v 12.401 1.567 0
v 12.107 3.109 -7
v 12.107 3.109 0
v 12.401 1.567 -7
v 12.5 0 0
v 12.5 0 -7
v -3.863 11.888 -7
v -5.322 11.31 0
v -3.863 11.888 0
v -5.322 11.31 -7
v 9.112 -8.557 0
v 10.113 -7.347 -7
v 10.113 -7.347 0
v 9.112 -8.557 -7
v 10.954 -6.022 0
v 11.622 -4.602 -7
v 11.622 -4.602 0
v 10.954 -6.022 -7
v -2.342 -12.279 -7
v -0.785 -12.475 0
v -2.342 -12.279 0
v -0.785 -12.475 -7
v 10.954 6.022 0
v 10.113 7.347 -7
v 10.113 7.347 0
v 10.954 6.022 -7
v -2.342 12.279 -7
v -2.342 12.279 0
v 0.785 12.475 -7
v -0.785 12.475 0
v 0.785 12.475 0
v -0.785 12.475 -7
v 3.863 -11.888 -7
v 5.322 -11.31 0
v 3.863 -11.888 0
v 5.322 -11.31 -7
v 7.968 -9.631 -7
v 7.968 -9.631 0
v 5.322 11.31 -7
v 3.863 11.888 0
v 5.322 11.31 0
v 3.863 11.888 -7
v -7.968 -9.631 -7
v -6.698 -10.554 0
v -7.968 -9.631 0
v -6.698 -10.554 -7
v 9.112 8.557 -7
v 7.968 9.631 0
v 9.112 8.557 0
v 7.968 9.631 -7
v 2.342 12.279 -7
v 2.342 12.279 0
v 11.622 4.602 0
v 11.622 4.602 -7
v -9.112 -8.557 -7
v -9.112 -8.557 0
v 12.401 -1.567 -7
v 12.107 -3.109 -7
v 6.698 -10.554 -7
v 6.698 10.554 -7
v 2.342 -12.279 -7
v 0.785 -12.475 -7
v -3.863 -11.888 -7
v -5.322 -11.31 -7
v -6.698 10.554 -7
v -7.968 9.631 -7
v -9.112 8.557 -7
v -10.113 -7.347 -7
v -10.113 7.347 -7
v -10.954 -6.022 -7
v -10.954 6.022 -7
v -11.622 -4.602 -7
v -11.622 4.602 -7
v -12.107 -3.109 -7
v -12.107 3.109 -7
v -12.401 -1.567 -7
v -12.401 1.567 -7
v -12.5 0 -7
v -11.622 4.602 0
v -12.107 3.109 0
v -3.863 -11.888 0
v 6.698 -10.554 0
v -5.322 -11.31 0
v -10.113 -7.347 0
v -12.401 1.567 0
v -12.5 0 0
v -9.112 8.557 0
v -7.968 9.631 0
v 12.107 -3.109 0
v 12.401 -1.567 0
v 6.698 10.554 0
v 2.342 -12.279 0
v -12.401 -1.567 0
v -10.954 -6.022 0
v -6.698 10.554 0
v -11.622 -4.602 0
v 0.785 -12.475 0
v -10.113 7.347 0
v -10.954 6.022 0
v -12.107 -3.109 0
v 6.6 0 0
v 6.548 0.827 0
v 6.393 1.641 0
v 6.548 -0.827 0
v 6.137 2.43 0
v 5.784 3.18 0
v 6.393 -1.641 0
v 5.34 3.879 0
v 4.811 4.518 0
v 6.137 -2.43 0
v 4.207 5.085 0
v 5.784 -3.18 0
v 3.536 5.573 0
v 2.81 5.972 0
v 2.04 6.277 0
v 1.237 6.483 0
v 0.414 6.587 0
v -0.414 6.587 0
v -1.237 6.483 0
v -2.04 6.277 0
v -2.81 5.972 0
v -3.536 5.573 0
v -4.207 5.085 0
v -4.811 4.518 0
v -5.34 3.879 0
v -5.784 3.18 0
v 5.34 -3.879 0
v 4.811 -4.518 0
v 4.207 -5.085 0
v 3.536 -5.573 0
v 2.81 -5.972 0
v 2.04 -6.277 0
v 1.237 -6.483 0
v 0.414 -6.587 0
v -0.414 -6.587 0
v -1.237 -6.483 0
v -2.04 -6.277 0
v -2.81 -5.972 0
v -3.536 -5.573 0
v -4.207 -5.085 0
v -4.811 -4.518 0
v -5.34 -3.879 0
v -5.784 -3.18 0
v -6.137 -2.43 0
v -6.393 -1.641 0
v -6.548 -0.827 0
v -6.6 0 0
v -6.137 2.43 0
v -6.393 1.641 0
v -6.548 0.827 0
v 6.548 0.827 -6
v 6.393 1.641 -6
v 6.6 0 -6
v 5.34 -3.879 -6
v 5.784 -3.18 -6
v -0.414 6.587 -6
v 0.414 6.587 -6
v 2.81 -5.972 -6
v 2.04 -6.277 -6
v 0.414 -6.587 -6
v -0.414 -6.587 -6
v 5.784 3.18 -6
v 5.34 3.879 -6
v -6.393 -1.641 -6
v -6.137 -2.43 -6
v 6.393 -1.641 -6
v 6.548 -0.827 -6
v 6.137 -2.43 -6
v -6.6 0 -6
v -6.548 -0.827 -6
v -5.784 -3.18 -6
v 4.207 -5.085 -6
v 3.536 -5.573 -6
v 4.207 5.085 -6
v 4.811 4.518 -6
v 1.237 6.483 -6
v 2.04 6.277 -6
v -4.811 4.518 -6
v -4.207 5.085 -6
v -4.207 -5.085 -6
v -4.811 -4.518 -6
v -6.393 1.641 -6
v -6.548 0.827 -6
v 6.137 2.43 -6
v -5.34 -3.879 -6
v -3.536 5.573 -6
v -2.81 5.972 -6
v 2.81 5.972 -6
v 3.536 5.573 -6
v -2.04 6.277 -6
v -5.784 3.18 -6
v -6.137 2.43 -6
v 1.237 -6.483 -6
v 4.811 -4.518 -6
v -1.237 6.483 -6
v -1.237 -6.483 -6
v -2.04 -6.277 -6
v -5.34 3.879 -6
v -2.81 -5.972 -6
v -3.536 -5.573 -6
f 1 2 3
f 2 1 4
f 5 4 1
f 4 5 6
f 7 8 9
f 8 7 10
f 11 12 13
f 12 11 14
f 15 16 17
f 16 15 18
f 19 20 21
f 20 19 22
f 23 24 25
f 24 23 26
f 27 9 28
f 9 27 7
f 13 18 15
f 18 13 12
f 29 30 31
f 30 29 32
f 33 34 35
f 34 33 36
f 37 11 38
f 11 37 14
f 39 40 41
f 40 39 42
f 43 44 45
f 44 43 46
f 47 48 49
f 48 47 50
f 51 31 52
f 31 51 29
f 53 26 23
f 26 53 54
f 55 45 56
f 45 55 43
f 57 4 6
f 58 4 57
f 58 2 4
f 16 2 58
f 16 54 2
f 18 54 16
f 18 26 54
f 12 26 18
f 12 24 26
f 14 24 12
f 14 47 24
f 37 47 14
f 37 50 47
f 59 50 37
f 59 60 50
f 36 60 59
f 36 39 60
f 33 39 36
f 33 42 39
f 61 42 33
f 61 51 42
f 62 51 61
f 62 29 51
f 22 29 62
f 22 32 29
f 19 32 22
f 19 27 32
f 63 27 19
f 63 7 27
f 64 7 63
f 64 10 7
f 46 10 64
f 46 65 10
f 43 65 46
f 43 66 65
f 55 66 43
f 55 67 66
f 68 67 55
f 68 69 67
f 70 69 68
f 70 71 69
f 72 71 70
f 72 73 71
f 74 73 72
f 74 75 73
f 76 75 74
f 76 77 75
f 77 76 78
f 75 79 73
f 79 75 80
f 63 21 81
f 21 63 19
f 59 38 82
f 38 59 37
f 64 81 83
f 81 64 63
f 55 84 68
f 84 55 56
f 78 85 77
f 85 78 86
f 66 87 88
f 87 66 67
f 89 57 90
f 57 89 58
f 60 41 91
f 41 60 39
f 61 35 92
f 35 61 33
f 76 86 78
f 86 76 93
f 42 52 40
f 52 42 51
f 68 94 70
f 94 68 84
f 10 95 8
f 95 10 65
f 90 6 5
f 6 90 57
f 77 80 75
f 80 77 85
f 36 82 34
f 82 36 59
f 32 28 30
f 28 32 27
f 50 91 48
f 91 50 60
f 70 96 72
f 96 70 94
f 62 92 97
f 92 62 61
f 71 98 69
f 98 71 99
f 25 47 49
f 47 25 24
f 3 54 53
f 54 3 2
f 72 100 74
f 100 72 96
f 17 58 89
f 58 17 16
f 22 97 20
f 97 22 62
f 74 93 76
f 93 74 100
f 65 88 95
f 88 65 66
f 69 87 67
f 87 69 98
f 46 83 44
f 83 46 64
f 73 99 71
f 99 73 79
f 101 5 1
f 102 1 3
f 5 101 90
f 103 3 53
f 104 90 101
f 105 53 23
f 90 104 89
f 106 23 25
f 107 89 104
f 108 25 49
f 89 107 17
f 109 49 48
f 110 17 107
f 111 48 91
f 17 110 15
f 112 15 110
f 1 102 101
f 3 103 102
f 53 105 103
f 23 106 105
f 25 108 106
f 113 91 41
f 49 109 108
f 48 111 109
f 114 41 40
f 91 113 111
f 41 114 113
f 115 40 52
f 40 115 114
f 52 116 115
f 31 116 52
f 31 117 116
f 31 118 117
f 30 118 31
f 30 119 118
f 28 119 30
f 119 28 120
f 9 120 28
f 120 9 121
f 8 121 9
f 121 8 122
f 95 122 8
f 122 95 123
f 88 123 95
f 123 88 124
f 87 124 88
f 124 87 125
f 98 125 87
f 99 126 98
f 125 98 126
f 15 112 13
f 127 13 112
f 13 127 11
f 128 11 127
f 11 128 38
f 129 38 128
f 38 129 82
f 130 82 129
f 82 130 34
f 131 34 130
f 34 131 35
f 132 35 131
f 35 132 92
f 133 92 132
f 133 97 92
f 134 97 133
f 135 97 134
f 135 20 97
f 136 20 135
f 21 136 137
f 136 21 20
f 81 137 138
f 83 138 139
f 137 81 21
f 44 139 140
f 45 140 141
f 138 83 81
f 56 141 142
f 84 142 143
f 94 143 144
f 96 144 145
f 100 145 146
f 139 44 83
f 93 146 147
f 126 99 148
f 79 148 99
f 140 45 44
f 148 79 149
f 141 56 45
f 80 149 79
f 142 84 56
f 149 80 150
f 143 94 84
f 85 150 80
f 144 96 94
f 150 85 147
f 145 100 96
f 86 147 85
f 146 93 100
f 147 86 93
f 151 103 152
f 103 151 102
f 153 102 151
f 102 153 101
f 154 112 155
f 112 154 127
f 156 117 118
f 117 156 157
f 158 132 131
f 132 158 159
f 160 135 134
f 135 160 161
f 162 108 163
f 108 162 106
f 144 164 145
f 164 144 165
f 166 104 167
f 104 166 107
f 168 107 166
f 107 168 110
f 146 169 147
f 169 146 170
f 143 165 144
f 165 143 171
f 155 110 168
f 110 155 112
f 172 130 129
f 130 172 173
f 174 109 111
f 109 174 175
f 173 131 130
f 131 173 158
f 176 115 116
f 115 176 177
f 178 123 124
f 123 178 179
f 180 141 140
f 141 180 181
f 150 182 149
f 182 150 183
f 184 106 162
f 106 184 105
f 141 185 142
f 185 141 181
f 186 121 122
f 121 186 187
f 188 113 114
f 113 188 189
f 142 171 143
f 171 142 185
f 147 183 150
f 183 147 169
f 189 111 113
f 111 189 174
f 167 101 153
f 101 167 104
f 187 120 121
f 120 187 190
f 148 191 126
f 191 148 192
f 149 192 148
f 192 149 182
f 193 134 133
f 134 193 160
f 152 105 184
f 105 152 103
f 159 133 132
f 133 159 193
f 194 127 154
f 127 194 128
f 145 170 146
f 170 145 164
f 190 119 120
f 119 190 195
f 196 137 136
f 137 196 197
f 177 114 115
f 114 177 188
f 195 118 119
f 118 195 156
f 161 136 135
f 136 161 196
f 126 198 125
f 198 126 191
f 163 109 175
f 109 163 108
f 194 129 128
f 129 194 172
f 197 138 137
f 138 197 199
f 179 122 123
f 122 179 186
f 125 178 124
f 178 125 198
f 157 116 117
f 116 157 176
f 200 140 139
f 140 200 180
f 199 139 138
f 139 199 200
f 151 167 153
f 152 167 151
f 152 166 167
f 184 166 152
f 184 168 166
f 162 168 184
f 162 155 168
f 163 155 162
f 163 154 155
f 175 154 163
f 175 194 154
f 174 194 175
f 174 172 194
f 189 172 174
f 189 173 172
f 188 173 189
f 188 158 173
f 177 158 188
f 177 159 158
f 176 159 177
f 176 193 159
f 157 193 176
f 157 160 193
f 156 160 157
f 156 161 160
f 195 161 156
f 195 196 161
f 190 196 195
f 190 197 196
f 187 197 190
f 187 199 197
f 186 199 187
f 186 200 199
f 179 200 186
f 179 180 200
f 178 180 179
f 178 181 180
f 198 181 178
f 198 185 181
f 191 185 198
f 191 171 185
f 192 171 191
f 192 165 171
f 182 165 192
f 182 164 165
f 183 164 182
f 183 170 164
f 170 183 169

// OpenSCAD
$fn = 50;


difference() {
	union() {
		translate(v = [0, 0, -7.0000000000]) {
			cylinder(h = 7, r = 12.5000000000);
		}
	}
	union() {
		#translate(v = [0, 0, -6.0000000000]) {
			cylinder(h = 6, r = 6.6000000000);
		}
	}
}
